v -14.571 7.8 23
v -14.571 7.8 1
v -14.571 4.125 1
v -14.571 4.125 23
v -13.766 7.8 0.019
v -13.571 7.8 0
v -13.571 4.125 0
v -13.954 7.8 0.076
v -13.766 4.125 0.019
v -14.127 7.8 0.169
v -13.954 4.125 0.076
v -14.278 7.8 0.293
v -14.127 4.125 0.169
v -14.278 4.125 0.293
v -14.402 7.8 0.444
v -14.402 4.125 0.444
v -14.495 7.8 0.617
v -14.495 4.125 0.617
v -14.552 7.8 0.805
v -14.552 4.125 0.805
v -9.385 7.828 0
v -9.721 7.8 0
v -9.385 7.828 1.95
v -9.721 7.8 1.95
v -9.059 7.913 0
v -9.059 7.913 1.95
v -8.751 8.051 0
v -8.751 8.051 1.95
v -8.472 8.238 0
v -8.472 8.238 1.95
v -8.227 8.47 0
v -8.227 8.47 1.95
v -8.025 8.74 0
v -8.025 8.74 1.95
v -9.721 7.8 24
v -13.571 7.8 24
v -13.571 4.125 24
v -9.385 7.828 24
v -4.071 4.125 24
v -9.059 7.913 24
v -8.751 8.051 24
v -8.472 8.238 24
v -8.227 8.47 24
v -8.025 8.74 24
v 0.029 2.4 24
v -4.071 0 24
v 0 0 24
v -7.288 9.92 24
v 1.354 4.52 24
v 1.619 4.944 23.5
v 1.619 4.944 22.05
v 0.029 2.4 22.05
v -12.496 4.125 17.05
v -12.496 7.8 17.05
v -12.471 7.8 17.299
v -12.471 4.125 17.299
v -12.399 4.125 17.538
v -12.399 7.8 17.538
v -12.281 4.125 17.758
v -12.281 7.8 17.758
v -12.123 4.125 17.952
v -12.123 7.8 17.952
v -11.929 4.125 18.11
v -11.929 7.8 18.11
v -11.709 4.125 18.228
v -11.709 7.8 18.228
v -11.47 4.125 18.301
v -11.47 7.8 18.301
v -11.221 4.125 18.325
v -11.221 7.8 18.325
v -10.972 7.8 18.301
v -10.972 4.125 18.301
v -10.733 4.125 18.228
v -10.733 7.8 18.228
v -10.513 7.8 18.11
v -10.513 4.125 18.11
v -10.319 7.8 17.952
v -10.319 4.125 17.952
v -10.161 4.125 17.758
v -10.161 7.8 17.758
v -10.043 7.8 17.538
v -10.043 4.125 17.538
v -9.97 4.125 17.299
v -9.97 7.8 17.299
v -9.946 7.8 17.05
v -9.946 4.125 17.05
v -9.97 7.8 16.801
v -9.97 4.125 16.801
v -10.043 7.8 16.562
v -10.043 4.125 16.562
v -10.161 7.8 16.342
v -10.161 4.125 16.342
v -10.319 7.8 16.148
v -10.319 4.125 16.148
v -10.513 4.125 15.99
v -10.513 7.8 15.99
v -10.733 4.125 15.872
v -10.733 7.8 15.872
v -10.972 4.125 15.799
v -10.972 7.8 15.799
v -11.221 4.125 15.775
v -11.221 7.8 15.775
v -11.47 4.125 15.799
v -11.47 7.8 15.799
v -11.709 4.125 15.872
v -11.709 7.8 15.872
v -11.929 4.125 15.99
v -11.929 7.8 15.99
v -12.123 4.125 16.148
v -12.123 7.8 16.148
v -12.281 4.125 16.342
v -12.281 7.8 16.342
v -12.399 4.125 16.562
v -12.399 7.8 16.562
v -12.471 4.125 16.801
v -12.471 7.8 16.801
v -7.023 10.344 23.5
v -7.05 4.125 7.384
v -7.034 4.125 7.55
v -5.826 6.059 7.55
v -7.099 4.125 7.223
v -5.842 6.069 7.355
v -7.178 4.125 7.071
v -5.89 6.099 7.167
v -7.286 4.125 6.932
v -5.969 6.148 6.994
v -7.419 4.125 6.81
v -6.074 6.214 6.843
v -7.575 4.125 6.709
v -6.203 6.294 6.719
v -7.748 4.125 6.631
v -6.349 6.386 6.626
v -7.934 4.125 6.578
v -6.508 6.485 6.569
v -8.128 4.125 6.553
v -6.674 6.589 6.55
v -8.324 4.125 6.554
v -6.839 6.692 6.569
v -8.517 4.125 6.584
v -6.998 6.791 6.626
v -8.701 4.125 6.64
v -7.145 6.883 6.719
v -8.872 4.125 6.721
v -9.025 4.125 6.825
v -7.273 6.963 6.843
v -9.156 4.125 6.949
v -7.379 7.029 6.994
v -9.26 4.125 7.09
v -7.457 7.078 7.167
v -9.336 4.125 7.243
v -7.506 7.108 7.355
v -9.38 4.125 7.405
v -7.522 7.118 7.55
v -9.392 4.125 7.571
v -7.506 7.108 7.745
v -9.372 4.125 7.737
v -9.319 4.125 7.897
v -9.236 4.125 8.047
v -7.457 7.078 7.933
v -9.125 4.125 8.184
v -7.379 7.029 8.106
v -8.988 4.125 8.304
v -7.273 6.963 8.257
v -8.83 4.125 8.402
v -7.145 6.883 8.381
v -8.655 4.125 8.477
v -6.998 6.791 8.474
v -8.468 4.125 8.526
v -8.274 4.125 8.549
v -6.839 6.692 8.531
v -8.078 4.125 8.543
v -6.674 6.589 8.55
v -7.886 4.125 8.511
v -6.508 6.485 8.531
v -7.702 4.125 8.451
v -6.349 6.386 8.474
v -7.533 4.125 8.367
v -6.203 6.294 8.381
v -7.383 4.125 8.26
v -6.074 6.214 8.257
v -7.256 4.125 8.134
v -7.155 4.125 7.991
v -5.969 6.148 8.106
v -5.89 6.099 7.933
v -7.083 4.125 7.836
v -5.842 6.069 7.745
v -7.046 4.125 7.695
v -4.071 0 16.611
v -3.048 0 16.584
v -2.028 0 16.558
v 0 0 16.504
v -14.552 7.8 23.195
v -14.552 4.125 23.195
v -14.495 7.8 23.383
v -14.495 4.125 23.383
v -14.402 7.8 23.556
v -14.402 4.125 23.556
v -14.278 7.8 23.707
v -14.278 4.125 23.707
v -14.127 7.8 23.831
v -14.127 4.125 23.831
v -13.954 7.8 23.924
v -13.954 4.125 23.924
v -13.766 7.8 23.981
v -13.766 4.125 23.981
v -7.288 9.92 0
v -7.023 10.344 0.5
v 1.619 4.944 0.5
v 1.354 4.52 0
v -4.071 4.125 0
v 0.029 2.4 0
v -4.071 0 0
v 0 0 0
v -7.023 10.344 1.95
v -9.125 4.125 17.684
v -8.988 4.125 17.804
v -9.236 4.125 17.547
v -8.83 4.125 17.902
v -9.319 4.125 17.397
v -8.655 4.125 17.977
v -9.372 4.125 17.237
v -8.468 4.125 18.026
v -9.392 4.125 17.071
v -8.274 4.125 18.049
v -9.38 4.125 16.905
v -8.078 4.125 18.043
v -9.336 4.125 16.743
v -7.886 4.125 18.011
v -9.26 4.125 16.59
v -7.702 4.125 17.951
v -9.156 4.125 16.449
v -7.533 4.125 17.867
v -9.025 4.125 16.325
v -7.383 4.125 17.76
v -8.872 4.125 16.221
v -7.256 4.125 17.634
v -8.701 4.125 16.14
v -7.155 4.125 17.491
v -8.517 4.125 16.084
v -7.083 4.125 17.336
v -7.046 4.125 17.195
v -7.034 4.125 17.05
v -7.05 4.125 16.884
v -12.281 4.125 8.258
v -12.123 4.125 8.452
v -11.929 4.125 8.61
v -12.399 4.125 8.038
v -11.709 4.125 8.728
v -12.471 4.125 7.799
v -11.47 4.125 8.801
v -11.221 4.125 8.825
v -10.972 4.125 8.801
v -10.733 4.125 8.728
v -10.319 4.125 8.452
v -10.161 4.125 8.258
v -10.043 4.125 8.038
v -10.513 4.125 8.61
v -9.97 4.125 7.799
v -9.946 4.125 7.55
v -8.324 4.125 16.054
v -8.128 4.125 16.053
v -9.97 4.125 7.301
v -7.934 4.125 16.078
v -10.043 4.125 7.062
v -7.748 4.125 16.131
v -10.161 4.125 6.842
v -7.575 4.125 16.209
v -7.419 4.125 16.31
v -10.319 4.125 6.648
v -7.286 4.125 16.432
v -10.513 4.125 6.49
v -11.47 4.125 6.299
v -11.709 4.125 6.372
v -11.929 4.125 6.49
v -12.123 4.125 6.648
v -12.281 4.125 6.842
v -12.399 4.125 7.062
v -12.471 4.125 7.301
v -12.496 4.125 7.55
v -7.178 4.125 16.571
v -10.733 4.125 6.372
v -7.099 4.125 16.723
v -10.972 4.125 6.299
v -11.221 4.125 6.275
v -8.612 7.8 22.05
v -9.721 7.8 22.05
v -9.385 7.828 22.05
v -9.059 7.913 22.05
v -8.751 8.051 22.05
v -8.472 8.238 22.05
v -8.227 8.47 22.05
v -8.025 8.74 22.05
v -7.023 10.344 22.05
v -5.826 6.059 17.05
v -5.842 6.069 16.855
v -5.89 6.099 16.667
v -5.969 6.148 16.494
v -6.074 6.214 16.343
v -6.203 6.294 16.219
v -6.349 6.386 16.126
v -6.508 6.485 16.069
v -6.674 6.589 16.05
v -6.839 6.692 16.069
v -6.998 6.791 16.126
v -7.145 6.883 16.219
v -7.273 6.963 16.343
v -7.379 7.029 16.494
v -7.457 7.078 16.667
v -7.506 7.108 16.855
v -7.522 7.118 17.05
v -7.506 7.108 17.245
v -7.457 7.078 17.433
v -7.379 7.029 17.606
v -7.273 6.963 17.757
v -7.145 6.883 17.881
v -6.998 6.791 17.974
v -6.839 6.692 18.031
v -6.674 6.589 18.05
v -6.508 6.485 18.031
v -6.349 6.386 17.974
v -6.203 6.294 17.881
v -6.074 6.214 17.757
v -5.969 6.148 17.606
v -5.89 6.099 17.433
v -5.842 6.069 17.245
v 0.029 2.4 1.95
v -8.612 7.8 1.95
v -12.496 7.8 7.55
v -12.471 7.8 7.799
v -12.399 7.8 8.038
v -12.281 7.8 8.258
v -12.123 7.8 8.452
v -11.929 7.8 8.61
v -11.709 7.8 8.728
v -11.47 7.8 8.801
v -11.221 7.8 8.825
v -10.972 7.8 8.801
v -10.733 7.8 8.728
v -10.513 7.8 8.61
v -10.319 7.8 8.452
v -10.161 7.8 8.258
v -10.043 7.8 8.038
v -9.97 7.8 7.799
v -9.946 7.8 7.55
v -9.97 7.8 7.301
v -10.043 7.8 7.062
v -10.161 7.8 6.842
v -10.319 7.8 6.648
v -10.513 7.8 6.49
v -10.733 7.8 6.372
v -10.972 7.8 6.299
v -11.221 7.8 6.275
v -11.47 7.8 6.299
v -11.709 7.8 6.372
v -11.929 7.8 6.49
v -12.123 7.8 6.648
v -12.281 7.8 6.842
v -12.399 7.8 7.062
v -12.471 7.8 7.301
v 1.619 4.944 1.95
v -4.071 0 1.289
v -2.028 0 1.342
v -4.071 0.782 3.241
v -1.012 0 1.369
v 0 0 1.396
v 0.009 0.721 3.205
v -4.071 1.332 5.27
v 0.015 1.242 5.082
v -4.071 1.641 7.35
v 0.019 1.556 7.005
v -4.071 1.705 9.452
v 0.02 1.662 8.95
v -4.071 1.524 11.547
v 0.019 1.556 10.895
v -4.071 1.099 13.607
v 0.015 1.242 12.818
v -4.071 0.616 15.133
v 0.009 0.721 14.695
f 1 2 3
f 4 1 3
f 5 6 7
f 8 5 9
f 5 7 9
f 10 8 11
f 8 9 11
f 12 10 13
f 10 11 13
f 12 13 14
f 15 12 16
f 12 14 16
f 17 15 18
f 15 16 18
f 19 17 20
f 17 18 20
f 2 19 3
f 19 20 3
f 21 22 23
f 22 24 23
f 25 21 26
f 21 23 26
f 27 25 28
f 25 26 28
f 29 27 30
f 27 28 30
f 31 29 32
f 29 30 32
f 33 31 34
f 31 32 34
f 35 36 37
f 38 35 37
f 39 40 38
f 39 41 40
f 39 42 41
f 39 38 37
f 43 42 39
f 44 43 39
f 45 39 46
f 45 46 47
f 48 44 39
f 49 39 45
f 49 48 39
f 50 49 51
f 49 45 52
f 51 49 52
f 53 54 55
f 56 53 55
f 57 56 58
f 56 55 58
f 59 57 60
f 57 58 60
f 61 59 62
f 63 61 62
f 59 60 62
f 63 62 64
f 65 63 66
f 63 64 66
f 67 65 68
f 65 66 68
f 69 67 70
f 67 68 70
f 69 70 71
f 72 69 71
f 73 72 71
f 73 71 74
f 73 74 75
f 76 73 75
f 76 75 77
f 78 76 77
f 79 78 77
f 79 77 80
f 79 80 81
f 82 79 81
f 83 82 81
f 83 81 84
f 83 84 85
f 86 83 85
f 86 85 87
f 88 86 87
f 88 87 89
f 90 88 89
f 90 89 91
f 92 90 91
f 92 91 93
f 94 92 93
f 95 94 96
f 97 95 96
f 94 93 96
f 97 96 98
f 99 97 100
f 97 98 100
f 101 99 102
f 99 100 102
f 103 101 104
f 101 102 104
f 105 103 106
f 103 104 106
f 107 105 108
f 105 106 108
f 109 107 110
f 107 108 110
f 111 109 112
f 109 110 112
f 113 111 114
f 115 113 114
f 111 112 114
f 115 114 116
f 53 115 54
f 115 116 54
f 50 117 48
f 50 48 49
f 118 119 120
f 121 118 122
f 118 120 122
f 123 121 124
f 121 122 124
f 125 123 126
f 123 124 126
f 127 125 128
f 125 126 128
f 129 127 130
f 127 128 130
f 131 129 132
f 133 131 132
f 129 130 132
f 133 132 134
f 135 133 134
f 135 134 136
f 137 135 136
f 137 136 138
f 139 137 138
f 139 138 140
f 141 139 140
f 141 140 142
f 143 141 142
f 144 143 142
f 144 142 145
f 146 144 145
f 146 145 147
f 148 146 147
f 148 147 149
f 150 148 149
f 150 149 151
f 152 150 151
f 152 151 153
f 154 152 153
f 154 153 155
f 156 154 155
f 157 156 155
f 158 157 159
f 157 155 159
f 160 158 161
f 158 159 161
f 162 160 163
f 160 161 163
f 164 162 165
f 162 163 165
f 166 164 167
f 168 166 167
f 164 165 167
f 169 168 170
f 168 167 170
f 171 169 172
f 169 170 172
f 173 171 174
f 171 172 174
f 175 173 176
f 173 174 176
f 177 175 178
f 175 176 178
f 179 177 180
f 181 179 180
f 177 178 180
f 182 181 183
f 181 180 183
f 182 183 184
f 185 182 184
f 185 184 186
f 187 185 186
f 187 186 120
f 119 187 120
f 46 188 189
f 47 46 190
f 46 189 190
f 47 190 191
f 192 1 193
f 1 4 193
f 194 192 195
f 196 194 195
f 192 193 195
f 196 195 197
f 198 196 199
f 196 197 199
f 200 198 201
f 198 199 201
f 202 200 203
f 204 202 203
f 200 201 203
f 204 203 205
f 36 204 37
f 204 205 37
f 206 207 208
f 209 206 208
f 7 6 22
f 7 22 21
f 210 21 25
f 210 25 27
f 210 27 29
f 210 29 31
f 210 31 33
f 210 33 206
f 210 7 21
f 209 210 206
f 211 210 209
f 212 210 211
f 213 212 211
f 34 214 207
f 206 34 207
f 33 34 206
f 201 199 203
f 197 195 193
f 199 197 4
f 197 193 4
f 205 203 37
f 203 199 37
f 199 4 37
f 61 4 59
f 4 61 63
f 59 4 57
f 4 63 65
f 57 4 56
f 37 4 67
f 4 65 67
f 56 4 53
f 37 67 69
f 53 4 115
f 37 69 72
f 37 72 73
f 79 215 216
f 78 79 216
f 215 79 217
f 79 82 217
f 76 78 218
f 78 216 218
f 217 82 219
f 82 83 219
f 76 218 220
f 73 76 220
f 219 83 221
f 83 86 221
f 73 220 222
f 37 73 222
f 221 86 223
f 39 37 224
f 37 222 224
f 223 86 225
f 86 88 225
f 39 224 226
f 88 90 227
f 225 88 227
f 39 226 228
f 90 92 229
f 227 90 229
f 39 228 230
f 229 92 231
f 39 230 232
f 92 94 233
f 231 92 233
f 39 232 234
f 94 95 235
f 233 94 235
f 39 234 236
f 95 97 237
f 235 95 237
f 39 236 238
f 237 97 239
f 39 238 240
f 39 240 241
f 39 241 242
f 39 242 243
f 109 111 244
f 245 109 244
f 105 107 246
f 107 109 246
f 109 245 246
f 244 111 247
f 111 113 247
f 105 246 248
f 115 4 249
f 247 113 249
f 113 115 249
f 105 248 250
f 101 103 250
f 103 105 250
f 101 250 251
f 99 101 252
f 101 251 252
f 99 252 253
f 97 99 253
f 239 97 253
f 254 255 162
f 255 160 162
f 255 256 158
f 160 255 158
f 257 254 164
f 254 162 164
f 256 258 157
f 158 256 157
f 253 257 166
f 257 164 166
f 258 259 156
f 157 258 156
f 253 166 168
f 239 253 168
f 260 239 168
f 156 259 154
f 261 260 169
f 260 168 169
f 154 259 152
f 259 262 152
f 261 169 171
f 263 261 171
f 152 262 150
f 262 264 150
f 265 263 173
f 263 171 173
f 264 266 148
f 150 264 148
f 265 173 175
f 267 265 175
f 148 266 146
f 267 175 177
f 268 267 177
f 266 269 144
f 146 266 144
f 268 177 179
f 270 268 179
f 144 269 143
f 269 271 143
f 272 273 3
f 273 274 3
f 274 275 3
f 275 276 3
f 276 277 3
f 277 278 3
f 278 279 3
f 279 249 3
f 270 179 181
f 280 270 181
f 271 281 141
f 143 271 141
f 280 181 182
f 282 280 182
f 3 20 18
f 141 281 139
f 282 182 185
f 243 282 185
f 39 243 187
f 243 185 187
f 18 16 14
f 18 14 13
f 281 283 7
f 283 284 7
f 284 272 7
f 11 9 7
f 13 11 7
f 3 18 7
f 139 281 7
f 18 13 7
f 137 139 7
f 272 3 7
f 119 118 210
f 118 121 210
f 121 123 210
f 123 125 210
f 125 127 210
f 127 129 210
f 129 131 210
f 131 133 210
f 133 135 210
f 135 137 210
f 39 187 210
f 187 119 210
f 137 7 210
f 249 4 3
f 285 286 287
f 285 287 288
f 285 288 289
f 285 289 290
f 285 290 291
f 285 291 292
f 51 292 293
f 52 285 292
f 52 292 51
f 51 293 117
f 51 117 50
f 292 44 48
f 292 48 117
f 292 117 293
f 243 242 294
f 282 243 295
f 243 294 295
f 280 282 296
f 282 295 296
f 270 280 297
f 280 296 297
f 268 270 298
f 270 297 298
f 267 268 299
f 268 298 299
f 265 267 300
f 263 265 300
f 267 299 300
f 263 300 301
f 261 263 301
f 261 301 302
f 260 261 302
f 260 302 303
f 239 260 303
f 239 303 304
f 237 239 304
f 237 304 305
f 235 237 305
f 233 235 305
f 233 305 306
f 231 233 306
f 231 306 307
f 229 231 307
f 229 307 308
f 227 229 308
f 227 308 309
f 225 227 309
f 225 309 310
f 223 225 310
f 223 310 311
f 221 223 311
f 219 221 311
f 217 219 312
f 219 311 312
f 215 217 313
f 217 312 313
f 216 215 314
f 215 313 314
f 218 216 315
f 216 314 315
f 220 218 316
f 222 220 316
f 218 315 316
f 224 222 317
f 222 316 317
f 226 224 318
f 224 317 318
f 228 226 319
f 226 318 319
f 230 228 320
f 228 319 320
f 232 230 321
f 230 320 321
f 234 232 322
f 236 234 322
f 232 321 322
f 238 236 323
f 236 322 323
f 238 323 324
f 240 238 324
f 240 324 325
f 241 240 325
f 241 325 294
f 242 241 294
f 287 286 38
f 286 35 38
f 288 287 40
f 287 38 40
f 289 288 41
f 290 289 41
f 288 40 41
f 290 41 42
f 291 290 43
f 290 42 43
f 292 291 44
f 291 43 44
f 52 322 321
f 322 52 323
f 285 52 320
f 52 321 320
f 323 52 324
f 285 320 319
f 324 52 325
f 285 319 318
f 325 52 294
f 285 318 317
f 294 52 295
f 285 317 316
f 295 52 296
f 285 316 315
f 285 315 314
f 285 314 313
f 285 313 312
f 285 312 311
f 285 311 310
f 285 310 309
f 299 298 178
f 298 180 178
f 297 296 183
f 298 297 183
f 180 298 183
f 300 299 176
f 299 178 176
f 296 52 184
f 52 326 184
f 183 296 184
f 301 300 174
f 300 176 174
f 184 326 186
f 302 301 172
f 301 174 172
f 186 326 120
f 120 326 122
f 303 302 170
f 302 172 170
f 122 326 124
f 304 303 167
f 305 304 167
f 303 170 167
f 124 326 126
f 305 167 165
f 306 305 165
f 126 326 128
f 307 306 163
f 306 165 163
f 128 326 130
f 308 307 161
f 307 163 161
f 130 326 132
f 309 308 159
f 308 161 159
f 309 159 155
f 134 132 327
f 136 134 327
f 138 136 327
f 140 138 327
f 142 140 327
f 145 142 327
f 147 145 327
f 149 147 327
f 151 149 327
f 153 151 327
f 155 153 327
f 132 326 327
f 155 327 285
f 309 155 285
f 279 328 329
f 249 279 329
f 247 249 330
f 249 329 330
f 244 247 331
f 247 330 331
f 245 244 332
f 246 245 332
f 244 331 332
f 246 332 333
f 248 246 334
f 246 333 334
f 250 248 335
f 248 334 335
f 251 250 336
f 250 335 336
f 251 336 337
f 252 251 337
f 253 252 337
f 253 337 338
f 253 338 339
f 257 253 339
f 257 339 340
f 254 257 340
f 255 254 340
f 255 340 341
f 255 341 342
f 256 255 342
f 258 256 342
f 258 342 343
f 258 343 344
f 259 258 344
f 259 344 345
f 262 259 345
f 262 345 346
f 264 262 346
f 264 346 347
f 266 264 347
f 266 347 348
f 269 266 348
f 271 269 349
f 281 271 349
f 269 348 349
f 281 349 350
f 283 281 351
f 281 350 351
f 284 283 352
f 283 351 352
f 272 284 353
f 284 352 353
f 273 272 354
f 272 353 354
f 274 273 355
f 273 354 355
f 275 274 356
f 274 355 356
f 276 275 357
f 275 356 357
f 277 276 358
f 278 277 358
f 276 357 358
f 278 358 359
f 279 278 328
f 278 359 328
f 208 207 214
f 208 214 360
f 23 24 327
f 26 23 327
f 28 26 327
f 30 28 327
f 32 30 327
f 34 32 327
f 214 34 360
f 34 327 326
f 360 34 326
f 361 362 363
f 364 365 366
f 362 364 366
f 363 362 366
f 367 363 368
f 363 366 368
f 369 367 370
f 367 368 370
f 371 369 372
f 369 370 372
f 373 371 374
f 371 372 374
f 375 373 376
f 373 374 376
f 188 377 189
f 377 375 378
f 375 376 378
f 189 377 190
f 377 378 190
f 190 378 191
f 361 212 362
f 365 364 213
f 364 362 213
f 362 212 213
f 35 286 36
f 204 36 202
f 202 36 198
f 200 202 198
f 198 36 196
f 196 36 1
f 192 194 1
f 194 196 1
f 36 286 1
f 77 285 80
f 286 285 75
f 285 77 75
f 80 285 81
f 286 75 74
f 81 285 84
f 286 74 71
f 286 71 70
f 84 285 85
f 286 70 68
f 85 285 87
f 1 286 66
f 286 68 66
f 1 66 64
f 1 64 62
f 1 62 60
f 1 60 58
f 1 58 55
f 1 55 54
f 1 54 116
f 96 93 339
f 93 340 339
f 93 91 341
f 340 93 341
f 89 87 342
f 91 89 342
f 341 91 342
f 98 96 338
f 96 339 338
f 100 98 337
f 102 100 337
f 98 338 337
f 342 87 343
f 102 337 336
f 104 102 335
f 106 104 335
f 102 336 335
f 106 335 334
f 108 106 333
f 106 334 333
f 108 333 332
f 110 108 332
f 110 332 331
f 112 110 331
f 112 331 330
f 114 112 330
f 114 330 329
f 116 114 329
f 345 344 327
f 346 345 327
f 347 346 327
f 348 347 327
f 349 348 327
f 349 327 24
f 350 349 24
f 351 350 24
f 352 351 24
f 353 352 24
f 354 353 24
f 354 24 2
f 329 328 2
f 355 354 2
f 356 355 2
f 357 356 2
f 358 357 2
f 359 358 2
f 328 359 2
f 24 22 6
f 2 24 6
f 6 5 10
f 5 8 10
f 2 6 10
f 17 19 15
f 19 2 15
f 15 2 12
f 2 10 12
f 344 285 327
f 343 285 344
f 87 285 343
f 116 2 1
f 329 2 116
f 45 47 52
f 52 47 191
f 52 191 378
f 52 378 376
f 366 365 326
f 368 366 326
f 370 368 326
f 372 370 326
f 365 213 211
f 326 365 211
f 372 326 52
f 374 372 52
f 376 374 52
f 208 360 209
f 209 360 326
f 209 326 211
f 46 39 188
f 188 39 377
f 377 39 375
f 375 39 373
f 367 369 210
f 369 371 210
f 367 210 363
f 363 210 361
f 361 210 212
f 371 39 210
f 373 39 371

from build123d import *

# Parameters (mm, degrees)
BOSS_EXTRUDE1_DEPTH = 24
SKETCH3_W           = 10.19023154
SKETCH3_H           = 1.95
BOSS_EXTRUDE2_DEPTH = 3
SKETCH5_R           = 18
CUT_EXTRUDE1_DEPTH  = 30.921809562
CHAMFER1_SIZE       = 0.5
FILLET1_R           = 1
SKETCH6_R           = 1.275
CUT_EXTRUDE2_DEPTH  = 30.14023621
SKETCH7_R           = 1
CUT_EXTRUDE3_DEPTH  = 31.169687207
FILLET2_R           = 2


with BuildPart() as part:
    # Sketch2 → Boss-Extrude1 (new body)
    with BuildSketch(Plane.XY):
        Polygon((-14.57097685, 4.125), (-4.07097685, 4.125), (-4.07097685, 0), (0, 0), (0.02932299, 2.4), (-8.612483466, 7.8), (-14.57097685, 7.8), align=None)
    extrude(amount=BOSS_EXTRUDE1_DEPTH)

    # Sketch3 → Boss-Extrude2 (add)
    with BuildSketch(Plane(origin=(1.086787174, 1.739223041, 0), x_dir=(0.8480480961564272, -0.5299192642332031, 0), z_dir=(0.5299192642332031, 0.8480480961564273, 0))):
        with Locations((-6.342054698, -0.975)):
            Rectangle(SKETCH3_W, SKETCH3_H)
        with Locations((-6.342054698, -23.025)):
            Rectangle(SKETCH3_W, SKETCH3_H)
    extrude(amount=BOSS_EXTRUDE2_DEPTH)

    # Sketch5 → Cut-Extrude1 (cut, through all)
    with BuildSketch(Plane(origin=(0, 0, 0), x_dir=(0, 0, -1), z_dir=(0.9999253696604522, -0.012217000835240004, 0))):
        with Locations((-8.95, -16.33799405)):
            Circle(SKETCH5_R)
    extrude(amount=-CUT_EXTRUDE1_DEPTH, mode=Mode.SUBTRACT)

    # Chamfer1
    chamfer1_edges = [part.edges().sort_by_distance(p)[0] for p in [
        (-2.701822445, 7.644144288, 0),
        (-2.701822445, 7.644144288, 24),
    ]]
    chamfer(chamfer1_edges, length=CHAMFER1_SIZE)

    # Fillet1
    fillet1_edges = [part.edges().sort_by_distance(p)[0] for p in [
        (-14.57097685, 5.9625, 24),
        (-14.57097685, 5.9625, 0),
    ]]
    fillet(fillet1_edges, radius=FILLET1_R)

    # Sketch6 → Cut-Extrude2 (cut, through all)
    with BuildSketch(Plane(origin=(0, 7.8, 0), x_dir=(1, 0, 0), z_dir=(0, 1, 0))):
        with Locations(Location((-11.22097685, -17.05, 0), (0, 0, 180))):
            Circle(SKETCH6_R)
        with Locations(Location((-11.22097685, -7.55, 0), (0, 0, 180))):
            Circle(SKETCH6_R)
    extrude(amount=-CUT_EXTRUDE2_DEPTH, mode=Mode.SUBTRACT)

    # Sketch7 → Cut-Extrude3 (cut, through all)
    with BuildSketch(Plane(origin=(2.676544967, 4.283367329, 0), x_dir=(0.8480480961564271, -0.5299192642332031, 0), z_dir=(0.5299192642332031, 0.8480480961564271, 0))):
        with Locations((-9.151078225, -17.05)):
            Circle(SKETCH7_R)
        with Locations((-9.151078225, -7.55)):
            Circle(SKETCH7_R)
    extrude(amount=-CUT_EXTRUDE3_DEPTH, mode=Mode.SUBTRACT)

    # Fillet2
    fillet2_edges = [part.edges().sort_by_distance(p)[0] for p in [
        (-8.612483466, 7.8, 23.025),
        (-8.612483466, 7.8, 0.975),
    ]]
    fillet(fillet2_edges, radius=FILLET2_R)


solid = part.part
